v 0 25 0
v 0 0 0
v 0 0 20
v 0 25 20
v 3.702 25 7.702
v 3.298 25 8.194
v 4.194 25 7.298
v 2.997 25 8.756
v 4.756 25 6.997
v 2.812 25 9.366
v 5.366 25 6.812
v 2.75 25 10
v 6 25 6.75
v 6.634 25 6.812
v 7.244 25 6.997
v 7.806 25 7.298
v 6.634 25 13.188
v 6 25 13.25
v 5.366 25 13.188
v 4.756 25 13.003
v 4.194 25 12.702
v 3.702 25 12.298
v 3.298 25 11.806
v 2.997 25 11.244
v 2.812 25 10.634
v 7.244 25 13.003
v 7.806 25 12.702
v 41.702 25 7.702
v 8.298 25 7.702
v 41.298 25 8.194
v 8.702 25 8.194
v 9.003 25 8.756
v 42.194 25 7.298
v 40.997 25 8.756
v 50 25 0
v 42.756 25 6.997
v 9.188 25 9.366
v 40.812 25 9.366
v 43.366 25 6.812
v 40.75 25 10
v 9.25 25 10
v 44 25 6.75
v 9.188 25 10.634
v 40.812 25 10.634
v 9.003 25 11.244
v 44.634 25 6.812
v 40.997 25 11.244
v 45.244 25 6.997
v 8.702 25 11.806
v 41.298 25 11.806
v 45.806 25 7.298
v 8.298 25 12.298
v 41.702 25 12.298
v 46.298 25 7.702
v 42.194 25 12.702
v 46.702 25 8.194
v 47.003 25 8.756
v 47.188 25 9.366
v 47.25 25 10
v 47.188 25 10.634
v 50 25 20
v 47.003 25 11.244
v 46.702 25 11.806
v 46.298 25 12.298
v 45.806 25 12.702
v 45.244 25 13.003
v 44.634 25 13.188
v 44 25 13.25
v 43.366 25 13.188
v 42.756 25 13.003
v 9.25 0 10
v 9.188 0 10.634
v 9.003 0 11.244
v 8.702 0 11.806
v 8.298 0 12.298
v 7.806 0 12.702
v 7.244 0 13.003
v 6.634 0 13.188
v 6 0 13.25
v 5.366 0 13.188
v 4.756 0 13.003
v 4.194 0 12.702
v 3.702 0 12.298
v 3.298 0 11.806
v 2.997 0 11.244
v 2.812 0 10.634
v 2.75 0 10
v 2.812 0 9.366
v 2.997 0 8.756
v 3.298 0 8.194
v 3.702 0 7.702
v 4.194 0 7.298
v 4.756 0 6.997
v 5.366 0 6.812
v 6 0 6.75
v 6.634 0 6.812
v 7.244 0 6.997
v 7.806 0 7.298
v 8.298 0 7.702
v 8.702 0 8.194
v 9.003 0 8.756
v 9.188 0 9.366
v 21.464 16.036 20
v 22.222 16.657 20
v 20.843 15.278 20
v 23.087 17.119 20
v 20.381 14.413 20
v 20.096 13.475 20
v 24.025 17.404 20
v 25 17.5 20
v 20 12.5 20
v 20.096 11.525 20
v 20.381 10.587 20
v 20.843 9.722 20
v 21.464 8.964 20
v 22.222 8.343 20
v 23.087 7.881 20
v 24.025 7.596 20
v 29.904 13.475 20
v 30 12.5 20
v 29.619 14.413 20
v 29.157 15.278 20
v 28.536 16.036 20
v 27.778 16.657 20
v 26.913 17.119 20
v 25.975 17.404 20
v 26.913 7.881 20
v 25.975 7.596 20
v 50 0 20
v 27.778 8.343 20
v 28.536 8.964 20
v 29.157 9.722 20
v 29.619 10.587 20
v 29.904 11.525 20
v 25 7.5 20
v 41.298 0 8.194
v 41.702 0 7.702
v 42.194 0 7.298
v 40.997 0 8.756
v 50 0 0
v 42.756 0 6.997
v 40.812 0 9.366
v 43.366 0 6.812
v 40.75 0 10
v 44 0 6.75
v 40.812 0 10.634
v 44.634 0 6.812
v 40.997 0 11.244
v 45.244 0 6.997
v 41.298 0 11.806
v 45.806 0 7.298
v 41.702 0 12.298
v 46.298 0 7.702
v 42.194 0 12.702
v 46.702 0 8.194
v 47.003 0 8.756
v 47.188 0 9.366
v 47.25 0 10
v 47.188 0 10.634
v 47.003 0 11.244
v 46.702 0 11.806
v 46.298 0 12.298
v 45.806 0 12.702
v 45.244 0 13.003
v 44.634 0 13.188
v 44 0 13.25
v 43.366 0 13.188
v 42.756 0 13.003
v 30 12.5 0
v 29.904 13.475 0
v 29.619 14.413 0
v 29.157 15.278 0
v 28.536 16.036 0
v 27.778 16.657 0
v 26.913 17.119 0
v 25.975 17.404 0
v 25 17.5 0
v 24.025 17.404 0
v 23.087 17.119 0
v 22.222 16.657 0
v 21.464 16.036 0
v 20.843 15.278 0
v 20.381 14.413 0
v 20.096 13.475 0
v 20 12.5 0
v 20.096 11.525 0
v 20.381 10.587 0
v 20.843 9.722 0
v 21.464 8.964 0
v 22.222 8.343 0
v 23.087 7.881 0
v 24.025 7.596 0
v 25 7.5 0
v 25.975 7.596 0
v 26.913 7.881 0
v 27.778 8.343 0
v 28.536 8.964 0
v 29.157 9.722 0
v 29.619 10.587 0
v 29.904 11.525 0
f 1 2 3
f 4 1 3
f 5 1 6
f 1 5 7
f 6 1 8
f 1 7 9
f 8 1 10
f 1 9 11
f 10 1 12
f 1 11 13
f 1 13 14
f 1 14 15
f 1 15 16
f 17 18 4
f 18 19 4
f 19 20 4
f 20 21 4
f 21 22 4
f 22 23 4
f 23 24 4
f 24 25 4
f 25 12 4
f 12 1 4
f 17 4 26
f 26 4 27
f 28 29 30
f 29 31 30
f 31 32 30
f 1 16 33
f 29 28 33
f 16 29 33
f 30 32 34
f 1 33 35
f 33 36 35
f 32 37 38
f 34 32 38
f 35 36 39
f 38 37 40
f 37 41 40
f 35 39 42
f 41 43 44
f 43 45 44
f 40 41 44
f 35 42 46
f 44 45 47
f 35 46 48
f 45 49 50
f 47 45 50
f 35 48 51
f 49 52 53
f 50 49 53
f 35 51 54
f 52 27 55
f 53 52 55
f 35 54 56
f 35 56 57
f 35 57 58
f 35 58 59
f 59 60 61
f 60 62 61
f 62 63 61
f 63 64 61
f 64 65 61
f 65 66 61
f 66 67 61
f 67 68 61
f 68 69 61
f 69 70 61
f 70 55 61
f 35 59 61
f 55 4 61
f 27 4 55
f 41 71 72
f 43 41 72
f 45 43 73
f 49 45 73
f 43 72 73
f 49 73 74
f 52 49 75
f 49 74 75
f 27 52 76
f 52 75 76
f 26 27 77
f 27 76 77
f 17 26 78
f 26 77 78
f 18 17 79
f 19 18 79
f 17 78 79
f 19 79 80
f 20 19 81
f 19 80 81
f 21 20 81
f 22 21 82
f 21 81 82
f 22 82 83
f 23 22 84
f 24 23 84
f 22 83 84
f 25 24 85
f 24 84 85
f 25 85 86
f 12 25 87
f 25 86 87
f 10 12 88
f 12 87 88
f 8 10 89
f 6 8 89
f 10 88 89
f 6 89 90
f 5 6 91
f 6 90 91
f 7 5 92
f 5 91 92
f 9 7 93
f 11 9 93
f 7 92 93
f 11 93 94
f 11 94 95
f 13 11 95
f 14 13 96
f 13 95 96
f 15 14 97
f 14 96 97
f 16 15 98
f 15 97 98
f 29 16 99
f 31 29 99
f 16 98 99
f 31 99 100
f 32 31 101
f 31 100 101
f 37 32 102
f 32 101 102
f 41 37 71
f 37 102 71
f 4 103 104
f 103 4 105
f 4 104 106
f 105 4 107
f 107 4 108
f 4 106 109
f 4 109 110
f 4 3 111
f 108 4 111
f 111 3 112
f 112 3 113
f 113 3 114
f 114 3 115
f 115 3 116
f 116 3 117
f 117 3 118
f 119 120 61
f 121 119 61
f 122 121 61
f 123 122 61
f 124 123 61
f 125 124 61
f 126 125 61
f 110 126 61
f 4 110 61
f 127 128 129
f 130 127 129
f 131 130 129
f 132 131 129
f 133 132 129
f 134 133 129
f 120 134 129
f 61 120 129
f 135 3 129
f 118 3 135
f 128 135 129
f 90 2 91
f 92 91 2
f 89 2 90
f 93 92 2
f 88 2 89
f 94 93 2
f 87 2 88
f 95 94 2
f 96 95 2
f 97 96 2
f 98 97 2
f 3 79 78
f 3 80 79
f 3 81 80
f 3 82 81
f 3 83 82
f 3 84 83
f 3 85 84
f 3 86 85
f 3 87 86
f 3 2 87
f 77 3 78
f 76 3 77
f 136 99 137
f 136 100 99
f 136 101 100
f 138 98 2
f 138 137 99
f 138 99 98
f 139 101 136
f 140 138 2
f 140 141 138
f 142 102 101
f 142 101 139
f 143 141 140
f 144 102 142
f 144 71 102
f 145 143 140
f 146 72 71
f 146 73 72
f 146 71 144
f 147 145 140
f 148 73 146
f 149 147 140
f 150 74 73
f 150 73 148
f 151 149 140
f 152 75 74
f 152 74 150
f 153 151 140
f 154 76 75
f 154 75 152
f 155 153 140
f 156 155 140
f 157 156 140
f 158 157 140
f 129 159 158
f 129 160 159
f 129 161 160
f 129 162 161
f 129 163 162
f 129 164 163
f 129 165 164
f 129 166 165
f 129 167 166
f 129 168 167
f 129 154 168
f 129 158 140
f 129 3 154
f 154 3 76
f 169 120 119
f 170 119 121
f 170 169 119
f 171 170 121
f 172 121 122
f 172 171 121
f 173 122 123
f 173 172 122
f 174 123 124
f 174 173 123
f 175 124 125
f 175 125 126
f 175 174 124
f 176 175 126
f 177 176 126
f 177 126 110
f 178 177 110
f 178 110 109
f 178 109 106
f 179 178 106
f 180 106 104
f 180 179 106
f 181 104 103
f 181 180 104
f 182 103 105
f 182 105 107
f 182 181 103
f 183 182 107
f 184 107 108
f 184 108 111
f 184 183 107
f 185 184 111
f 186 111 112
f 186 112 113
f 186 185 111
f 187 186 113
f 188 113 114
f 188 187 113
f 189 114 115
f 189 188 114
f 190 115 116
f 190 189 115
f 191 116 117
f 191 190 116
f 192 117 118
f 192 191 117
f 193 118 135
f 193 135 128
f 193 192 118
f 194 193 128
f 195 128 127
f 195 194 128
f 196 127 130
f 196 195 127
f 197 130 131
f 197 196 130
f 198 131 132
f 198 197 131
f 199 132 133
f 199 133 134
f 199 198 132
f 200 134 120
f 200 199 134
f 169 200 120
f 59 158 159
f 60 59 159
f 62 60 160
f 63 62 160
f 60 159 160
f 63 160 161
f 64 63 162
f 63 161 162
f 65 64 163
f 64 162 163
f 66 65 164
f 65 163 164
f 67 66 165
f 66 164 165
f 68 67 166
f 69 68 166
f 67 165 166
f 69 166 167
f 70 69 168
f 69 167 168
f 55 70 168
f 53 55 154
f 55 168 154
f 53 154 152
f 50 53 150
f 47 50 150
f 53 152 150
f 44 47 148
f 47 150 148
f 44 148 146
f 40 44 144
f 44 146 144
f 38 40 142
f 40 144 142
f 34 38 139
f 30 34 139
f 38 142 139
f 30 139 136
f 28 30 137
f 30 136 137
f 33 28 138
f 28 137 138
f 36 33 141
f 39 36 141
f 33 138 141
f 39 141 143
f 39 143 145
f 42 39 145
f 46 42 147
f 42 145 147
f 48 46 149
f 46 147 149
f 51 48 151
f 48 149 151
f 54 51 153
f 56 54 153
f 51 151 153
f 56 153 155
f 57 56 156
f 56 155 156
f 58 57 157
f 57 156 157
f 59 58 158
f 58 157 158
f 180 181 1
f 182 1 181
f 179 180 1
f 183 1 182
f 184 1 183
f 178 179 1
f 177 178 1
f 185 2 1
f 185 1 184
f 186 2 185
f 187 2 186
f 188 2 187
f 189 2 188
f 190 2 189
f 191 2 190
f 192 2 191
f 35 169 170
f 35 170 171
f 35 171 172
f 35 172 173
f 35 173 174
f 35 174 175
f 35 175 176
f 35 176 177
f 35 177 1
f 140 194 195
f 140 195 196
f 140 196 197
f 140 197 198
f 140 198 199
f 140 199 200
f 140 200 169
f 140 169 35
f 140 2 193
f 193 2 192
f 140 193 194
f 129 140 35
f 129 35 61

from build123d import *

# Parameters (mm, degrees)
F0_W     = 50
F0_H     = 20
F0_R     = 3.25
F1_DEPTH = 25
F2_R     = 5
F3_DEPTH = 20


with BuildPart() as f1:
    # F0 (on Front) → F1 (new body)
    with BuildSketch(Plane.XZ):
        with Locations((25, 10)):
            Rectangle(F0_W, F0_H)
        with Locations((6, 10)):
            Circle(F0_R, mode=Mode.SUBTRACT)
        with Locations((44, 10)):
            Circle(F0_R, mode=Mode.SUBTRACT)
    extrude(amount=-F1_DEPTH)


with BuildPart() as f3:
    # F2 (on Top) → F3 (new body)
    with BuildSketch(Plane.XY):
        with Locations((25, 12.5)):
            Circle(F2_R)
    extrude(amount=F3_DEPTH)


with BuildPart() as f1_1:
    add(f1.part)

    # F4: cut F3
    add(f3.part, mode=Mode.SUBTRACT)


solid = f1_1.part
